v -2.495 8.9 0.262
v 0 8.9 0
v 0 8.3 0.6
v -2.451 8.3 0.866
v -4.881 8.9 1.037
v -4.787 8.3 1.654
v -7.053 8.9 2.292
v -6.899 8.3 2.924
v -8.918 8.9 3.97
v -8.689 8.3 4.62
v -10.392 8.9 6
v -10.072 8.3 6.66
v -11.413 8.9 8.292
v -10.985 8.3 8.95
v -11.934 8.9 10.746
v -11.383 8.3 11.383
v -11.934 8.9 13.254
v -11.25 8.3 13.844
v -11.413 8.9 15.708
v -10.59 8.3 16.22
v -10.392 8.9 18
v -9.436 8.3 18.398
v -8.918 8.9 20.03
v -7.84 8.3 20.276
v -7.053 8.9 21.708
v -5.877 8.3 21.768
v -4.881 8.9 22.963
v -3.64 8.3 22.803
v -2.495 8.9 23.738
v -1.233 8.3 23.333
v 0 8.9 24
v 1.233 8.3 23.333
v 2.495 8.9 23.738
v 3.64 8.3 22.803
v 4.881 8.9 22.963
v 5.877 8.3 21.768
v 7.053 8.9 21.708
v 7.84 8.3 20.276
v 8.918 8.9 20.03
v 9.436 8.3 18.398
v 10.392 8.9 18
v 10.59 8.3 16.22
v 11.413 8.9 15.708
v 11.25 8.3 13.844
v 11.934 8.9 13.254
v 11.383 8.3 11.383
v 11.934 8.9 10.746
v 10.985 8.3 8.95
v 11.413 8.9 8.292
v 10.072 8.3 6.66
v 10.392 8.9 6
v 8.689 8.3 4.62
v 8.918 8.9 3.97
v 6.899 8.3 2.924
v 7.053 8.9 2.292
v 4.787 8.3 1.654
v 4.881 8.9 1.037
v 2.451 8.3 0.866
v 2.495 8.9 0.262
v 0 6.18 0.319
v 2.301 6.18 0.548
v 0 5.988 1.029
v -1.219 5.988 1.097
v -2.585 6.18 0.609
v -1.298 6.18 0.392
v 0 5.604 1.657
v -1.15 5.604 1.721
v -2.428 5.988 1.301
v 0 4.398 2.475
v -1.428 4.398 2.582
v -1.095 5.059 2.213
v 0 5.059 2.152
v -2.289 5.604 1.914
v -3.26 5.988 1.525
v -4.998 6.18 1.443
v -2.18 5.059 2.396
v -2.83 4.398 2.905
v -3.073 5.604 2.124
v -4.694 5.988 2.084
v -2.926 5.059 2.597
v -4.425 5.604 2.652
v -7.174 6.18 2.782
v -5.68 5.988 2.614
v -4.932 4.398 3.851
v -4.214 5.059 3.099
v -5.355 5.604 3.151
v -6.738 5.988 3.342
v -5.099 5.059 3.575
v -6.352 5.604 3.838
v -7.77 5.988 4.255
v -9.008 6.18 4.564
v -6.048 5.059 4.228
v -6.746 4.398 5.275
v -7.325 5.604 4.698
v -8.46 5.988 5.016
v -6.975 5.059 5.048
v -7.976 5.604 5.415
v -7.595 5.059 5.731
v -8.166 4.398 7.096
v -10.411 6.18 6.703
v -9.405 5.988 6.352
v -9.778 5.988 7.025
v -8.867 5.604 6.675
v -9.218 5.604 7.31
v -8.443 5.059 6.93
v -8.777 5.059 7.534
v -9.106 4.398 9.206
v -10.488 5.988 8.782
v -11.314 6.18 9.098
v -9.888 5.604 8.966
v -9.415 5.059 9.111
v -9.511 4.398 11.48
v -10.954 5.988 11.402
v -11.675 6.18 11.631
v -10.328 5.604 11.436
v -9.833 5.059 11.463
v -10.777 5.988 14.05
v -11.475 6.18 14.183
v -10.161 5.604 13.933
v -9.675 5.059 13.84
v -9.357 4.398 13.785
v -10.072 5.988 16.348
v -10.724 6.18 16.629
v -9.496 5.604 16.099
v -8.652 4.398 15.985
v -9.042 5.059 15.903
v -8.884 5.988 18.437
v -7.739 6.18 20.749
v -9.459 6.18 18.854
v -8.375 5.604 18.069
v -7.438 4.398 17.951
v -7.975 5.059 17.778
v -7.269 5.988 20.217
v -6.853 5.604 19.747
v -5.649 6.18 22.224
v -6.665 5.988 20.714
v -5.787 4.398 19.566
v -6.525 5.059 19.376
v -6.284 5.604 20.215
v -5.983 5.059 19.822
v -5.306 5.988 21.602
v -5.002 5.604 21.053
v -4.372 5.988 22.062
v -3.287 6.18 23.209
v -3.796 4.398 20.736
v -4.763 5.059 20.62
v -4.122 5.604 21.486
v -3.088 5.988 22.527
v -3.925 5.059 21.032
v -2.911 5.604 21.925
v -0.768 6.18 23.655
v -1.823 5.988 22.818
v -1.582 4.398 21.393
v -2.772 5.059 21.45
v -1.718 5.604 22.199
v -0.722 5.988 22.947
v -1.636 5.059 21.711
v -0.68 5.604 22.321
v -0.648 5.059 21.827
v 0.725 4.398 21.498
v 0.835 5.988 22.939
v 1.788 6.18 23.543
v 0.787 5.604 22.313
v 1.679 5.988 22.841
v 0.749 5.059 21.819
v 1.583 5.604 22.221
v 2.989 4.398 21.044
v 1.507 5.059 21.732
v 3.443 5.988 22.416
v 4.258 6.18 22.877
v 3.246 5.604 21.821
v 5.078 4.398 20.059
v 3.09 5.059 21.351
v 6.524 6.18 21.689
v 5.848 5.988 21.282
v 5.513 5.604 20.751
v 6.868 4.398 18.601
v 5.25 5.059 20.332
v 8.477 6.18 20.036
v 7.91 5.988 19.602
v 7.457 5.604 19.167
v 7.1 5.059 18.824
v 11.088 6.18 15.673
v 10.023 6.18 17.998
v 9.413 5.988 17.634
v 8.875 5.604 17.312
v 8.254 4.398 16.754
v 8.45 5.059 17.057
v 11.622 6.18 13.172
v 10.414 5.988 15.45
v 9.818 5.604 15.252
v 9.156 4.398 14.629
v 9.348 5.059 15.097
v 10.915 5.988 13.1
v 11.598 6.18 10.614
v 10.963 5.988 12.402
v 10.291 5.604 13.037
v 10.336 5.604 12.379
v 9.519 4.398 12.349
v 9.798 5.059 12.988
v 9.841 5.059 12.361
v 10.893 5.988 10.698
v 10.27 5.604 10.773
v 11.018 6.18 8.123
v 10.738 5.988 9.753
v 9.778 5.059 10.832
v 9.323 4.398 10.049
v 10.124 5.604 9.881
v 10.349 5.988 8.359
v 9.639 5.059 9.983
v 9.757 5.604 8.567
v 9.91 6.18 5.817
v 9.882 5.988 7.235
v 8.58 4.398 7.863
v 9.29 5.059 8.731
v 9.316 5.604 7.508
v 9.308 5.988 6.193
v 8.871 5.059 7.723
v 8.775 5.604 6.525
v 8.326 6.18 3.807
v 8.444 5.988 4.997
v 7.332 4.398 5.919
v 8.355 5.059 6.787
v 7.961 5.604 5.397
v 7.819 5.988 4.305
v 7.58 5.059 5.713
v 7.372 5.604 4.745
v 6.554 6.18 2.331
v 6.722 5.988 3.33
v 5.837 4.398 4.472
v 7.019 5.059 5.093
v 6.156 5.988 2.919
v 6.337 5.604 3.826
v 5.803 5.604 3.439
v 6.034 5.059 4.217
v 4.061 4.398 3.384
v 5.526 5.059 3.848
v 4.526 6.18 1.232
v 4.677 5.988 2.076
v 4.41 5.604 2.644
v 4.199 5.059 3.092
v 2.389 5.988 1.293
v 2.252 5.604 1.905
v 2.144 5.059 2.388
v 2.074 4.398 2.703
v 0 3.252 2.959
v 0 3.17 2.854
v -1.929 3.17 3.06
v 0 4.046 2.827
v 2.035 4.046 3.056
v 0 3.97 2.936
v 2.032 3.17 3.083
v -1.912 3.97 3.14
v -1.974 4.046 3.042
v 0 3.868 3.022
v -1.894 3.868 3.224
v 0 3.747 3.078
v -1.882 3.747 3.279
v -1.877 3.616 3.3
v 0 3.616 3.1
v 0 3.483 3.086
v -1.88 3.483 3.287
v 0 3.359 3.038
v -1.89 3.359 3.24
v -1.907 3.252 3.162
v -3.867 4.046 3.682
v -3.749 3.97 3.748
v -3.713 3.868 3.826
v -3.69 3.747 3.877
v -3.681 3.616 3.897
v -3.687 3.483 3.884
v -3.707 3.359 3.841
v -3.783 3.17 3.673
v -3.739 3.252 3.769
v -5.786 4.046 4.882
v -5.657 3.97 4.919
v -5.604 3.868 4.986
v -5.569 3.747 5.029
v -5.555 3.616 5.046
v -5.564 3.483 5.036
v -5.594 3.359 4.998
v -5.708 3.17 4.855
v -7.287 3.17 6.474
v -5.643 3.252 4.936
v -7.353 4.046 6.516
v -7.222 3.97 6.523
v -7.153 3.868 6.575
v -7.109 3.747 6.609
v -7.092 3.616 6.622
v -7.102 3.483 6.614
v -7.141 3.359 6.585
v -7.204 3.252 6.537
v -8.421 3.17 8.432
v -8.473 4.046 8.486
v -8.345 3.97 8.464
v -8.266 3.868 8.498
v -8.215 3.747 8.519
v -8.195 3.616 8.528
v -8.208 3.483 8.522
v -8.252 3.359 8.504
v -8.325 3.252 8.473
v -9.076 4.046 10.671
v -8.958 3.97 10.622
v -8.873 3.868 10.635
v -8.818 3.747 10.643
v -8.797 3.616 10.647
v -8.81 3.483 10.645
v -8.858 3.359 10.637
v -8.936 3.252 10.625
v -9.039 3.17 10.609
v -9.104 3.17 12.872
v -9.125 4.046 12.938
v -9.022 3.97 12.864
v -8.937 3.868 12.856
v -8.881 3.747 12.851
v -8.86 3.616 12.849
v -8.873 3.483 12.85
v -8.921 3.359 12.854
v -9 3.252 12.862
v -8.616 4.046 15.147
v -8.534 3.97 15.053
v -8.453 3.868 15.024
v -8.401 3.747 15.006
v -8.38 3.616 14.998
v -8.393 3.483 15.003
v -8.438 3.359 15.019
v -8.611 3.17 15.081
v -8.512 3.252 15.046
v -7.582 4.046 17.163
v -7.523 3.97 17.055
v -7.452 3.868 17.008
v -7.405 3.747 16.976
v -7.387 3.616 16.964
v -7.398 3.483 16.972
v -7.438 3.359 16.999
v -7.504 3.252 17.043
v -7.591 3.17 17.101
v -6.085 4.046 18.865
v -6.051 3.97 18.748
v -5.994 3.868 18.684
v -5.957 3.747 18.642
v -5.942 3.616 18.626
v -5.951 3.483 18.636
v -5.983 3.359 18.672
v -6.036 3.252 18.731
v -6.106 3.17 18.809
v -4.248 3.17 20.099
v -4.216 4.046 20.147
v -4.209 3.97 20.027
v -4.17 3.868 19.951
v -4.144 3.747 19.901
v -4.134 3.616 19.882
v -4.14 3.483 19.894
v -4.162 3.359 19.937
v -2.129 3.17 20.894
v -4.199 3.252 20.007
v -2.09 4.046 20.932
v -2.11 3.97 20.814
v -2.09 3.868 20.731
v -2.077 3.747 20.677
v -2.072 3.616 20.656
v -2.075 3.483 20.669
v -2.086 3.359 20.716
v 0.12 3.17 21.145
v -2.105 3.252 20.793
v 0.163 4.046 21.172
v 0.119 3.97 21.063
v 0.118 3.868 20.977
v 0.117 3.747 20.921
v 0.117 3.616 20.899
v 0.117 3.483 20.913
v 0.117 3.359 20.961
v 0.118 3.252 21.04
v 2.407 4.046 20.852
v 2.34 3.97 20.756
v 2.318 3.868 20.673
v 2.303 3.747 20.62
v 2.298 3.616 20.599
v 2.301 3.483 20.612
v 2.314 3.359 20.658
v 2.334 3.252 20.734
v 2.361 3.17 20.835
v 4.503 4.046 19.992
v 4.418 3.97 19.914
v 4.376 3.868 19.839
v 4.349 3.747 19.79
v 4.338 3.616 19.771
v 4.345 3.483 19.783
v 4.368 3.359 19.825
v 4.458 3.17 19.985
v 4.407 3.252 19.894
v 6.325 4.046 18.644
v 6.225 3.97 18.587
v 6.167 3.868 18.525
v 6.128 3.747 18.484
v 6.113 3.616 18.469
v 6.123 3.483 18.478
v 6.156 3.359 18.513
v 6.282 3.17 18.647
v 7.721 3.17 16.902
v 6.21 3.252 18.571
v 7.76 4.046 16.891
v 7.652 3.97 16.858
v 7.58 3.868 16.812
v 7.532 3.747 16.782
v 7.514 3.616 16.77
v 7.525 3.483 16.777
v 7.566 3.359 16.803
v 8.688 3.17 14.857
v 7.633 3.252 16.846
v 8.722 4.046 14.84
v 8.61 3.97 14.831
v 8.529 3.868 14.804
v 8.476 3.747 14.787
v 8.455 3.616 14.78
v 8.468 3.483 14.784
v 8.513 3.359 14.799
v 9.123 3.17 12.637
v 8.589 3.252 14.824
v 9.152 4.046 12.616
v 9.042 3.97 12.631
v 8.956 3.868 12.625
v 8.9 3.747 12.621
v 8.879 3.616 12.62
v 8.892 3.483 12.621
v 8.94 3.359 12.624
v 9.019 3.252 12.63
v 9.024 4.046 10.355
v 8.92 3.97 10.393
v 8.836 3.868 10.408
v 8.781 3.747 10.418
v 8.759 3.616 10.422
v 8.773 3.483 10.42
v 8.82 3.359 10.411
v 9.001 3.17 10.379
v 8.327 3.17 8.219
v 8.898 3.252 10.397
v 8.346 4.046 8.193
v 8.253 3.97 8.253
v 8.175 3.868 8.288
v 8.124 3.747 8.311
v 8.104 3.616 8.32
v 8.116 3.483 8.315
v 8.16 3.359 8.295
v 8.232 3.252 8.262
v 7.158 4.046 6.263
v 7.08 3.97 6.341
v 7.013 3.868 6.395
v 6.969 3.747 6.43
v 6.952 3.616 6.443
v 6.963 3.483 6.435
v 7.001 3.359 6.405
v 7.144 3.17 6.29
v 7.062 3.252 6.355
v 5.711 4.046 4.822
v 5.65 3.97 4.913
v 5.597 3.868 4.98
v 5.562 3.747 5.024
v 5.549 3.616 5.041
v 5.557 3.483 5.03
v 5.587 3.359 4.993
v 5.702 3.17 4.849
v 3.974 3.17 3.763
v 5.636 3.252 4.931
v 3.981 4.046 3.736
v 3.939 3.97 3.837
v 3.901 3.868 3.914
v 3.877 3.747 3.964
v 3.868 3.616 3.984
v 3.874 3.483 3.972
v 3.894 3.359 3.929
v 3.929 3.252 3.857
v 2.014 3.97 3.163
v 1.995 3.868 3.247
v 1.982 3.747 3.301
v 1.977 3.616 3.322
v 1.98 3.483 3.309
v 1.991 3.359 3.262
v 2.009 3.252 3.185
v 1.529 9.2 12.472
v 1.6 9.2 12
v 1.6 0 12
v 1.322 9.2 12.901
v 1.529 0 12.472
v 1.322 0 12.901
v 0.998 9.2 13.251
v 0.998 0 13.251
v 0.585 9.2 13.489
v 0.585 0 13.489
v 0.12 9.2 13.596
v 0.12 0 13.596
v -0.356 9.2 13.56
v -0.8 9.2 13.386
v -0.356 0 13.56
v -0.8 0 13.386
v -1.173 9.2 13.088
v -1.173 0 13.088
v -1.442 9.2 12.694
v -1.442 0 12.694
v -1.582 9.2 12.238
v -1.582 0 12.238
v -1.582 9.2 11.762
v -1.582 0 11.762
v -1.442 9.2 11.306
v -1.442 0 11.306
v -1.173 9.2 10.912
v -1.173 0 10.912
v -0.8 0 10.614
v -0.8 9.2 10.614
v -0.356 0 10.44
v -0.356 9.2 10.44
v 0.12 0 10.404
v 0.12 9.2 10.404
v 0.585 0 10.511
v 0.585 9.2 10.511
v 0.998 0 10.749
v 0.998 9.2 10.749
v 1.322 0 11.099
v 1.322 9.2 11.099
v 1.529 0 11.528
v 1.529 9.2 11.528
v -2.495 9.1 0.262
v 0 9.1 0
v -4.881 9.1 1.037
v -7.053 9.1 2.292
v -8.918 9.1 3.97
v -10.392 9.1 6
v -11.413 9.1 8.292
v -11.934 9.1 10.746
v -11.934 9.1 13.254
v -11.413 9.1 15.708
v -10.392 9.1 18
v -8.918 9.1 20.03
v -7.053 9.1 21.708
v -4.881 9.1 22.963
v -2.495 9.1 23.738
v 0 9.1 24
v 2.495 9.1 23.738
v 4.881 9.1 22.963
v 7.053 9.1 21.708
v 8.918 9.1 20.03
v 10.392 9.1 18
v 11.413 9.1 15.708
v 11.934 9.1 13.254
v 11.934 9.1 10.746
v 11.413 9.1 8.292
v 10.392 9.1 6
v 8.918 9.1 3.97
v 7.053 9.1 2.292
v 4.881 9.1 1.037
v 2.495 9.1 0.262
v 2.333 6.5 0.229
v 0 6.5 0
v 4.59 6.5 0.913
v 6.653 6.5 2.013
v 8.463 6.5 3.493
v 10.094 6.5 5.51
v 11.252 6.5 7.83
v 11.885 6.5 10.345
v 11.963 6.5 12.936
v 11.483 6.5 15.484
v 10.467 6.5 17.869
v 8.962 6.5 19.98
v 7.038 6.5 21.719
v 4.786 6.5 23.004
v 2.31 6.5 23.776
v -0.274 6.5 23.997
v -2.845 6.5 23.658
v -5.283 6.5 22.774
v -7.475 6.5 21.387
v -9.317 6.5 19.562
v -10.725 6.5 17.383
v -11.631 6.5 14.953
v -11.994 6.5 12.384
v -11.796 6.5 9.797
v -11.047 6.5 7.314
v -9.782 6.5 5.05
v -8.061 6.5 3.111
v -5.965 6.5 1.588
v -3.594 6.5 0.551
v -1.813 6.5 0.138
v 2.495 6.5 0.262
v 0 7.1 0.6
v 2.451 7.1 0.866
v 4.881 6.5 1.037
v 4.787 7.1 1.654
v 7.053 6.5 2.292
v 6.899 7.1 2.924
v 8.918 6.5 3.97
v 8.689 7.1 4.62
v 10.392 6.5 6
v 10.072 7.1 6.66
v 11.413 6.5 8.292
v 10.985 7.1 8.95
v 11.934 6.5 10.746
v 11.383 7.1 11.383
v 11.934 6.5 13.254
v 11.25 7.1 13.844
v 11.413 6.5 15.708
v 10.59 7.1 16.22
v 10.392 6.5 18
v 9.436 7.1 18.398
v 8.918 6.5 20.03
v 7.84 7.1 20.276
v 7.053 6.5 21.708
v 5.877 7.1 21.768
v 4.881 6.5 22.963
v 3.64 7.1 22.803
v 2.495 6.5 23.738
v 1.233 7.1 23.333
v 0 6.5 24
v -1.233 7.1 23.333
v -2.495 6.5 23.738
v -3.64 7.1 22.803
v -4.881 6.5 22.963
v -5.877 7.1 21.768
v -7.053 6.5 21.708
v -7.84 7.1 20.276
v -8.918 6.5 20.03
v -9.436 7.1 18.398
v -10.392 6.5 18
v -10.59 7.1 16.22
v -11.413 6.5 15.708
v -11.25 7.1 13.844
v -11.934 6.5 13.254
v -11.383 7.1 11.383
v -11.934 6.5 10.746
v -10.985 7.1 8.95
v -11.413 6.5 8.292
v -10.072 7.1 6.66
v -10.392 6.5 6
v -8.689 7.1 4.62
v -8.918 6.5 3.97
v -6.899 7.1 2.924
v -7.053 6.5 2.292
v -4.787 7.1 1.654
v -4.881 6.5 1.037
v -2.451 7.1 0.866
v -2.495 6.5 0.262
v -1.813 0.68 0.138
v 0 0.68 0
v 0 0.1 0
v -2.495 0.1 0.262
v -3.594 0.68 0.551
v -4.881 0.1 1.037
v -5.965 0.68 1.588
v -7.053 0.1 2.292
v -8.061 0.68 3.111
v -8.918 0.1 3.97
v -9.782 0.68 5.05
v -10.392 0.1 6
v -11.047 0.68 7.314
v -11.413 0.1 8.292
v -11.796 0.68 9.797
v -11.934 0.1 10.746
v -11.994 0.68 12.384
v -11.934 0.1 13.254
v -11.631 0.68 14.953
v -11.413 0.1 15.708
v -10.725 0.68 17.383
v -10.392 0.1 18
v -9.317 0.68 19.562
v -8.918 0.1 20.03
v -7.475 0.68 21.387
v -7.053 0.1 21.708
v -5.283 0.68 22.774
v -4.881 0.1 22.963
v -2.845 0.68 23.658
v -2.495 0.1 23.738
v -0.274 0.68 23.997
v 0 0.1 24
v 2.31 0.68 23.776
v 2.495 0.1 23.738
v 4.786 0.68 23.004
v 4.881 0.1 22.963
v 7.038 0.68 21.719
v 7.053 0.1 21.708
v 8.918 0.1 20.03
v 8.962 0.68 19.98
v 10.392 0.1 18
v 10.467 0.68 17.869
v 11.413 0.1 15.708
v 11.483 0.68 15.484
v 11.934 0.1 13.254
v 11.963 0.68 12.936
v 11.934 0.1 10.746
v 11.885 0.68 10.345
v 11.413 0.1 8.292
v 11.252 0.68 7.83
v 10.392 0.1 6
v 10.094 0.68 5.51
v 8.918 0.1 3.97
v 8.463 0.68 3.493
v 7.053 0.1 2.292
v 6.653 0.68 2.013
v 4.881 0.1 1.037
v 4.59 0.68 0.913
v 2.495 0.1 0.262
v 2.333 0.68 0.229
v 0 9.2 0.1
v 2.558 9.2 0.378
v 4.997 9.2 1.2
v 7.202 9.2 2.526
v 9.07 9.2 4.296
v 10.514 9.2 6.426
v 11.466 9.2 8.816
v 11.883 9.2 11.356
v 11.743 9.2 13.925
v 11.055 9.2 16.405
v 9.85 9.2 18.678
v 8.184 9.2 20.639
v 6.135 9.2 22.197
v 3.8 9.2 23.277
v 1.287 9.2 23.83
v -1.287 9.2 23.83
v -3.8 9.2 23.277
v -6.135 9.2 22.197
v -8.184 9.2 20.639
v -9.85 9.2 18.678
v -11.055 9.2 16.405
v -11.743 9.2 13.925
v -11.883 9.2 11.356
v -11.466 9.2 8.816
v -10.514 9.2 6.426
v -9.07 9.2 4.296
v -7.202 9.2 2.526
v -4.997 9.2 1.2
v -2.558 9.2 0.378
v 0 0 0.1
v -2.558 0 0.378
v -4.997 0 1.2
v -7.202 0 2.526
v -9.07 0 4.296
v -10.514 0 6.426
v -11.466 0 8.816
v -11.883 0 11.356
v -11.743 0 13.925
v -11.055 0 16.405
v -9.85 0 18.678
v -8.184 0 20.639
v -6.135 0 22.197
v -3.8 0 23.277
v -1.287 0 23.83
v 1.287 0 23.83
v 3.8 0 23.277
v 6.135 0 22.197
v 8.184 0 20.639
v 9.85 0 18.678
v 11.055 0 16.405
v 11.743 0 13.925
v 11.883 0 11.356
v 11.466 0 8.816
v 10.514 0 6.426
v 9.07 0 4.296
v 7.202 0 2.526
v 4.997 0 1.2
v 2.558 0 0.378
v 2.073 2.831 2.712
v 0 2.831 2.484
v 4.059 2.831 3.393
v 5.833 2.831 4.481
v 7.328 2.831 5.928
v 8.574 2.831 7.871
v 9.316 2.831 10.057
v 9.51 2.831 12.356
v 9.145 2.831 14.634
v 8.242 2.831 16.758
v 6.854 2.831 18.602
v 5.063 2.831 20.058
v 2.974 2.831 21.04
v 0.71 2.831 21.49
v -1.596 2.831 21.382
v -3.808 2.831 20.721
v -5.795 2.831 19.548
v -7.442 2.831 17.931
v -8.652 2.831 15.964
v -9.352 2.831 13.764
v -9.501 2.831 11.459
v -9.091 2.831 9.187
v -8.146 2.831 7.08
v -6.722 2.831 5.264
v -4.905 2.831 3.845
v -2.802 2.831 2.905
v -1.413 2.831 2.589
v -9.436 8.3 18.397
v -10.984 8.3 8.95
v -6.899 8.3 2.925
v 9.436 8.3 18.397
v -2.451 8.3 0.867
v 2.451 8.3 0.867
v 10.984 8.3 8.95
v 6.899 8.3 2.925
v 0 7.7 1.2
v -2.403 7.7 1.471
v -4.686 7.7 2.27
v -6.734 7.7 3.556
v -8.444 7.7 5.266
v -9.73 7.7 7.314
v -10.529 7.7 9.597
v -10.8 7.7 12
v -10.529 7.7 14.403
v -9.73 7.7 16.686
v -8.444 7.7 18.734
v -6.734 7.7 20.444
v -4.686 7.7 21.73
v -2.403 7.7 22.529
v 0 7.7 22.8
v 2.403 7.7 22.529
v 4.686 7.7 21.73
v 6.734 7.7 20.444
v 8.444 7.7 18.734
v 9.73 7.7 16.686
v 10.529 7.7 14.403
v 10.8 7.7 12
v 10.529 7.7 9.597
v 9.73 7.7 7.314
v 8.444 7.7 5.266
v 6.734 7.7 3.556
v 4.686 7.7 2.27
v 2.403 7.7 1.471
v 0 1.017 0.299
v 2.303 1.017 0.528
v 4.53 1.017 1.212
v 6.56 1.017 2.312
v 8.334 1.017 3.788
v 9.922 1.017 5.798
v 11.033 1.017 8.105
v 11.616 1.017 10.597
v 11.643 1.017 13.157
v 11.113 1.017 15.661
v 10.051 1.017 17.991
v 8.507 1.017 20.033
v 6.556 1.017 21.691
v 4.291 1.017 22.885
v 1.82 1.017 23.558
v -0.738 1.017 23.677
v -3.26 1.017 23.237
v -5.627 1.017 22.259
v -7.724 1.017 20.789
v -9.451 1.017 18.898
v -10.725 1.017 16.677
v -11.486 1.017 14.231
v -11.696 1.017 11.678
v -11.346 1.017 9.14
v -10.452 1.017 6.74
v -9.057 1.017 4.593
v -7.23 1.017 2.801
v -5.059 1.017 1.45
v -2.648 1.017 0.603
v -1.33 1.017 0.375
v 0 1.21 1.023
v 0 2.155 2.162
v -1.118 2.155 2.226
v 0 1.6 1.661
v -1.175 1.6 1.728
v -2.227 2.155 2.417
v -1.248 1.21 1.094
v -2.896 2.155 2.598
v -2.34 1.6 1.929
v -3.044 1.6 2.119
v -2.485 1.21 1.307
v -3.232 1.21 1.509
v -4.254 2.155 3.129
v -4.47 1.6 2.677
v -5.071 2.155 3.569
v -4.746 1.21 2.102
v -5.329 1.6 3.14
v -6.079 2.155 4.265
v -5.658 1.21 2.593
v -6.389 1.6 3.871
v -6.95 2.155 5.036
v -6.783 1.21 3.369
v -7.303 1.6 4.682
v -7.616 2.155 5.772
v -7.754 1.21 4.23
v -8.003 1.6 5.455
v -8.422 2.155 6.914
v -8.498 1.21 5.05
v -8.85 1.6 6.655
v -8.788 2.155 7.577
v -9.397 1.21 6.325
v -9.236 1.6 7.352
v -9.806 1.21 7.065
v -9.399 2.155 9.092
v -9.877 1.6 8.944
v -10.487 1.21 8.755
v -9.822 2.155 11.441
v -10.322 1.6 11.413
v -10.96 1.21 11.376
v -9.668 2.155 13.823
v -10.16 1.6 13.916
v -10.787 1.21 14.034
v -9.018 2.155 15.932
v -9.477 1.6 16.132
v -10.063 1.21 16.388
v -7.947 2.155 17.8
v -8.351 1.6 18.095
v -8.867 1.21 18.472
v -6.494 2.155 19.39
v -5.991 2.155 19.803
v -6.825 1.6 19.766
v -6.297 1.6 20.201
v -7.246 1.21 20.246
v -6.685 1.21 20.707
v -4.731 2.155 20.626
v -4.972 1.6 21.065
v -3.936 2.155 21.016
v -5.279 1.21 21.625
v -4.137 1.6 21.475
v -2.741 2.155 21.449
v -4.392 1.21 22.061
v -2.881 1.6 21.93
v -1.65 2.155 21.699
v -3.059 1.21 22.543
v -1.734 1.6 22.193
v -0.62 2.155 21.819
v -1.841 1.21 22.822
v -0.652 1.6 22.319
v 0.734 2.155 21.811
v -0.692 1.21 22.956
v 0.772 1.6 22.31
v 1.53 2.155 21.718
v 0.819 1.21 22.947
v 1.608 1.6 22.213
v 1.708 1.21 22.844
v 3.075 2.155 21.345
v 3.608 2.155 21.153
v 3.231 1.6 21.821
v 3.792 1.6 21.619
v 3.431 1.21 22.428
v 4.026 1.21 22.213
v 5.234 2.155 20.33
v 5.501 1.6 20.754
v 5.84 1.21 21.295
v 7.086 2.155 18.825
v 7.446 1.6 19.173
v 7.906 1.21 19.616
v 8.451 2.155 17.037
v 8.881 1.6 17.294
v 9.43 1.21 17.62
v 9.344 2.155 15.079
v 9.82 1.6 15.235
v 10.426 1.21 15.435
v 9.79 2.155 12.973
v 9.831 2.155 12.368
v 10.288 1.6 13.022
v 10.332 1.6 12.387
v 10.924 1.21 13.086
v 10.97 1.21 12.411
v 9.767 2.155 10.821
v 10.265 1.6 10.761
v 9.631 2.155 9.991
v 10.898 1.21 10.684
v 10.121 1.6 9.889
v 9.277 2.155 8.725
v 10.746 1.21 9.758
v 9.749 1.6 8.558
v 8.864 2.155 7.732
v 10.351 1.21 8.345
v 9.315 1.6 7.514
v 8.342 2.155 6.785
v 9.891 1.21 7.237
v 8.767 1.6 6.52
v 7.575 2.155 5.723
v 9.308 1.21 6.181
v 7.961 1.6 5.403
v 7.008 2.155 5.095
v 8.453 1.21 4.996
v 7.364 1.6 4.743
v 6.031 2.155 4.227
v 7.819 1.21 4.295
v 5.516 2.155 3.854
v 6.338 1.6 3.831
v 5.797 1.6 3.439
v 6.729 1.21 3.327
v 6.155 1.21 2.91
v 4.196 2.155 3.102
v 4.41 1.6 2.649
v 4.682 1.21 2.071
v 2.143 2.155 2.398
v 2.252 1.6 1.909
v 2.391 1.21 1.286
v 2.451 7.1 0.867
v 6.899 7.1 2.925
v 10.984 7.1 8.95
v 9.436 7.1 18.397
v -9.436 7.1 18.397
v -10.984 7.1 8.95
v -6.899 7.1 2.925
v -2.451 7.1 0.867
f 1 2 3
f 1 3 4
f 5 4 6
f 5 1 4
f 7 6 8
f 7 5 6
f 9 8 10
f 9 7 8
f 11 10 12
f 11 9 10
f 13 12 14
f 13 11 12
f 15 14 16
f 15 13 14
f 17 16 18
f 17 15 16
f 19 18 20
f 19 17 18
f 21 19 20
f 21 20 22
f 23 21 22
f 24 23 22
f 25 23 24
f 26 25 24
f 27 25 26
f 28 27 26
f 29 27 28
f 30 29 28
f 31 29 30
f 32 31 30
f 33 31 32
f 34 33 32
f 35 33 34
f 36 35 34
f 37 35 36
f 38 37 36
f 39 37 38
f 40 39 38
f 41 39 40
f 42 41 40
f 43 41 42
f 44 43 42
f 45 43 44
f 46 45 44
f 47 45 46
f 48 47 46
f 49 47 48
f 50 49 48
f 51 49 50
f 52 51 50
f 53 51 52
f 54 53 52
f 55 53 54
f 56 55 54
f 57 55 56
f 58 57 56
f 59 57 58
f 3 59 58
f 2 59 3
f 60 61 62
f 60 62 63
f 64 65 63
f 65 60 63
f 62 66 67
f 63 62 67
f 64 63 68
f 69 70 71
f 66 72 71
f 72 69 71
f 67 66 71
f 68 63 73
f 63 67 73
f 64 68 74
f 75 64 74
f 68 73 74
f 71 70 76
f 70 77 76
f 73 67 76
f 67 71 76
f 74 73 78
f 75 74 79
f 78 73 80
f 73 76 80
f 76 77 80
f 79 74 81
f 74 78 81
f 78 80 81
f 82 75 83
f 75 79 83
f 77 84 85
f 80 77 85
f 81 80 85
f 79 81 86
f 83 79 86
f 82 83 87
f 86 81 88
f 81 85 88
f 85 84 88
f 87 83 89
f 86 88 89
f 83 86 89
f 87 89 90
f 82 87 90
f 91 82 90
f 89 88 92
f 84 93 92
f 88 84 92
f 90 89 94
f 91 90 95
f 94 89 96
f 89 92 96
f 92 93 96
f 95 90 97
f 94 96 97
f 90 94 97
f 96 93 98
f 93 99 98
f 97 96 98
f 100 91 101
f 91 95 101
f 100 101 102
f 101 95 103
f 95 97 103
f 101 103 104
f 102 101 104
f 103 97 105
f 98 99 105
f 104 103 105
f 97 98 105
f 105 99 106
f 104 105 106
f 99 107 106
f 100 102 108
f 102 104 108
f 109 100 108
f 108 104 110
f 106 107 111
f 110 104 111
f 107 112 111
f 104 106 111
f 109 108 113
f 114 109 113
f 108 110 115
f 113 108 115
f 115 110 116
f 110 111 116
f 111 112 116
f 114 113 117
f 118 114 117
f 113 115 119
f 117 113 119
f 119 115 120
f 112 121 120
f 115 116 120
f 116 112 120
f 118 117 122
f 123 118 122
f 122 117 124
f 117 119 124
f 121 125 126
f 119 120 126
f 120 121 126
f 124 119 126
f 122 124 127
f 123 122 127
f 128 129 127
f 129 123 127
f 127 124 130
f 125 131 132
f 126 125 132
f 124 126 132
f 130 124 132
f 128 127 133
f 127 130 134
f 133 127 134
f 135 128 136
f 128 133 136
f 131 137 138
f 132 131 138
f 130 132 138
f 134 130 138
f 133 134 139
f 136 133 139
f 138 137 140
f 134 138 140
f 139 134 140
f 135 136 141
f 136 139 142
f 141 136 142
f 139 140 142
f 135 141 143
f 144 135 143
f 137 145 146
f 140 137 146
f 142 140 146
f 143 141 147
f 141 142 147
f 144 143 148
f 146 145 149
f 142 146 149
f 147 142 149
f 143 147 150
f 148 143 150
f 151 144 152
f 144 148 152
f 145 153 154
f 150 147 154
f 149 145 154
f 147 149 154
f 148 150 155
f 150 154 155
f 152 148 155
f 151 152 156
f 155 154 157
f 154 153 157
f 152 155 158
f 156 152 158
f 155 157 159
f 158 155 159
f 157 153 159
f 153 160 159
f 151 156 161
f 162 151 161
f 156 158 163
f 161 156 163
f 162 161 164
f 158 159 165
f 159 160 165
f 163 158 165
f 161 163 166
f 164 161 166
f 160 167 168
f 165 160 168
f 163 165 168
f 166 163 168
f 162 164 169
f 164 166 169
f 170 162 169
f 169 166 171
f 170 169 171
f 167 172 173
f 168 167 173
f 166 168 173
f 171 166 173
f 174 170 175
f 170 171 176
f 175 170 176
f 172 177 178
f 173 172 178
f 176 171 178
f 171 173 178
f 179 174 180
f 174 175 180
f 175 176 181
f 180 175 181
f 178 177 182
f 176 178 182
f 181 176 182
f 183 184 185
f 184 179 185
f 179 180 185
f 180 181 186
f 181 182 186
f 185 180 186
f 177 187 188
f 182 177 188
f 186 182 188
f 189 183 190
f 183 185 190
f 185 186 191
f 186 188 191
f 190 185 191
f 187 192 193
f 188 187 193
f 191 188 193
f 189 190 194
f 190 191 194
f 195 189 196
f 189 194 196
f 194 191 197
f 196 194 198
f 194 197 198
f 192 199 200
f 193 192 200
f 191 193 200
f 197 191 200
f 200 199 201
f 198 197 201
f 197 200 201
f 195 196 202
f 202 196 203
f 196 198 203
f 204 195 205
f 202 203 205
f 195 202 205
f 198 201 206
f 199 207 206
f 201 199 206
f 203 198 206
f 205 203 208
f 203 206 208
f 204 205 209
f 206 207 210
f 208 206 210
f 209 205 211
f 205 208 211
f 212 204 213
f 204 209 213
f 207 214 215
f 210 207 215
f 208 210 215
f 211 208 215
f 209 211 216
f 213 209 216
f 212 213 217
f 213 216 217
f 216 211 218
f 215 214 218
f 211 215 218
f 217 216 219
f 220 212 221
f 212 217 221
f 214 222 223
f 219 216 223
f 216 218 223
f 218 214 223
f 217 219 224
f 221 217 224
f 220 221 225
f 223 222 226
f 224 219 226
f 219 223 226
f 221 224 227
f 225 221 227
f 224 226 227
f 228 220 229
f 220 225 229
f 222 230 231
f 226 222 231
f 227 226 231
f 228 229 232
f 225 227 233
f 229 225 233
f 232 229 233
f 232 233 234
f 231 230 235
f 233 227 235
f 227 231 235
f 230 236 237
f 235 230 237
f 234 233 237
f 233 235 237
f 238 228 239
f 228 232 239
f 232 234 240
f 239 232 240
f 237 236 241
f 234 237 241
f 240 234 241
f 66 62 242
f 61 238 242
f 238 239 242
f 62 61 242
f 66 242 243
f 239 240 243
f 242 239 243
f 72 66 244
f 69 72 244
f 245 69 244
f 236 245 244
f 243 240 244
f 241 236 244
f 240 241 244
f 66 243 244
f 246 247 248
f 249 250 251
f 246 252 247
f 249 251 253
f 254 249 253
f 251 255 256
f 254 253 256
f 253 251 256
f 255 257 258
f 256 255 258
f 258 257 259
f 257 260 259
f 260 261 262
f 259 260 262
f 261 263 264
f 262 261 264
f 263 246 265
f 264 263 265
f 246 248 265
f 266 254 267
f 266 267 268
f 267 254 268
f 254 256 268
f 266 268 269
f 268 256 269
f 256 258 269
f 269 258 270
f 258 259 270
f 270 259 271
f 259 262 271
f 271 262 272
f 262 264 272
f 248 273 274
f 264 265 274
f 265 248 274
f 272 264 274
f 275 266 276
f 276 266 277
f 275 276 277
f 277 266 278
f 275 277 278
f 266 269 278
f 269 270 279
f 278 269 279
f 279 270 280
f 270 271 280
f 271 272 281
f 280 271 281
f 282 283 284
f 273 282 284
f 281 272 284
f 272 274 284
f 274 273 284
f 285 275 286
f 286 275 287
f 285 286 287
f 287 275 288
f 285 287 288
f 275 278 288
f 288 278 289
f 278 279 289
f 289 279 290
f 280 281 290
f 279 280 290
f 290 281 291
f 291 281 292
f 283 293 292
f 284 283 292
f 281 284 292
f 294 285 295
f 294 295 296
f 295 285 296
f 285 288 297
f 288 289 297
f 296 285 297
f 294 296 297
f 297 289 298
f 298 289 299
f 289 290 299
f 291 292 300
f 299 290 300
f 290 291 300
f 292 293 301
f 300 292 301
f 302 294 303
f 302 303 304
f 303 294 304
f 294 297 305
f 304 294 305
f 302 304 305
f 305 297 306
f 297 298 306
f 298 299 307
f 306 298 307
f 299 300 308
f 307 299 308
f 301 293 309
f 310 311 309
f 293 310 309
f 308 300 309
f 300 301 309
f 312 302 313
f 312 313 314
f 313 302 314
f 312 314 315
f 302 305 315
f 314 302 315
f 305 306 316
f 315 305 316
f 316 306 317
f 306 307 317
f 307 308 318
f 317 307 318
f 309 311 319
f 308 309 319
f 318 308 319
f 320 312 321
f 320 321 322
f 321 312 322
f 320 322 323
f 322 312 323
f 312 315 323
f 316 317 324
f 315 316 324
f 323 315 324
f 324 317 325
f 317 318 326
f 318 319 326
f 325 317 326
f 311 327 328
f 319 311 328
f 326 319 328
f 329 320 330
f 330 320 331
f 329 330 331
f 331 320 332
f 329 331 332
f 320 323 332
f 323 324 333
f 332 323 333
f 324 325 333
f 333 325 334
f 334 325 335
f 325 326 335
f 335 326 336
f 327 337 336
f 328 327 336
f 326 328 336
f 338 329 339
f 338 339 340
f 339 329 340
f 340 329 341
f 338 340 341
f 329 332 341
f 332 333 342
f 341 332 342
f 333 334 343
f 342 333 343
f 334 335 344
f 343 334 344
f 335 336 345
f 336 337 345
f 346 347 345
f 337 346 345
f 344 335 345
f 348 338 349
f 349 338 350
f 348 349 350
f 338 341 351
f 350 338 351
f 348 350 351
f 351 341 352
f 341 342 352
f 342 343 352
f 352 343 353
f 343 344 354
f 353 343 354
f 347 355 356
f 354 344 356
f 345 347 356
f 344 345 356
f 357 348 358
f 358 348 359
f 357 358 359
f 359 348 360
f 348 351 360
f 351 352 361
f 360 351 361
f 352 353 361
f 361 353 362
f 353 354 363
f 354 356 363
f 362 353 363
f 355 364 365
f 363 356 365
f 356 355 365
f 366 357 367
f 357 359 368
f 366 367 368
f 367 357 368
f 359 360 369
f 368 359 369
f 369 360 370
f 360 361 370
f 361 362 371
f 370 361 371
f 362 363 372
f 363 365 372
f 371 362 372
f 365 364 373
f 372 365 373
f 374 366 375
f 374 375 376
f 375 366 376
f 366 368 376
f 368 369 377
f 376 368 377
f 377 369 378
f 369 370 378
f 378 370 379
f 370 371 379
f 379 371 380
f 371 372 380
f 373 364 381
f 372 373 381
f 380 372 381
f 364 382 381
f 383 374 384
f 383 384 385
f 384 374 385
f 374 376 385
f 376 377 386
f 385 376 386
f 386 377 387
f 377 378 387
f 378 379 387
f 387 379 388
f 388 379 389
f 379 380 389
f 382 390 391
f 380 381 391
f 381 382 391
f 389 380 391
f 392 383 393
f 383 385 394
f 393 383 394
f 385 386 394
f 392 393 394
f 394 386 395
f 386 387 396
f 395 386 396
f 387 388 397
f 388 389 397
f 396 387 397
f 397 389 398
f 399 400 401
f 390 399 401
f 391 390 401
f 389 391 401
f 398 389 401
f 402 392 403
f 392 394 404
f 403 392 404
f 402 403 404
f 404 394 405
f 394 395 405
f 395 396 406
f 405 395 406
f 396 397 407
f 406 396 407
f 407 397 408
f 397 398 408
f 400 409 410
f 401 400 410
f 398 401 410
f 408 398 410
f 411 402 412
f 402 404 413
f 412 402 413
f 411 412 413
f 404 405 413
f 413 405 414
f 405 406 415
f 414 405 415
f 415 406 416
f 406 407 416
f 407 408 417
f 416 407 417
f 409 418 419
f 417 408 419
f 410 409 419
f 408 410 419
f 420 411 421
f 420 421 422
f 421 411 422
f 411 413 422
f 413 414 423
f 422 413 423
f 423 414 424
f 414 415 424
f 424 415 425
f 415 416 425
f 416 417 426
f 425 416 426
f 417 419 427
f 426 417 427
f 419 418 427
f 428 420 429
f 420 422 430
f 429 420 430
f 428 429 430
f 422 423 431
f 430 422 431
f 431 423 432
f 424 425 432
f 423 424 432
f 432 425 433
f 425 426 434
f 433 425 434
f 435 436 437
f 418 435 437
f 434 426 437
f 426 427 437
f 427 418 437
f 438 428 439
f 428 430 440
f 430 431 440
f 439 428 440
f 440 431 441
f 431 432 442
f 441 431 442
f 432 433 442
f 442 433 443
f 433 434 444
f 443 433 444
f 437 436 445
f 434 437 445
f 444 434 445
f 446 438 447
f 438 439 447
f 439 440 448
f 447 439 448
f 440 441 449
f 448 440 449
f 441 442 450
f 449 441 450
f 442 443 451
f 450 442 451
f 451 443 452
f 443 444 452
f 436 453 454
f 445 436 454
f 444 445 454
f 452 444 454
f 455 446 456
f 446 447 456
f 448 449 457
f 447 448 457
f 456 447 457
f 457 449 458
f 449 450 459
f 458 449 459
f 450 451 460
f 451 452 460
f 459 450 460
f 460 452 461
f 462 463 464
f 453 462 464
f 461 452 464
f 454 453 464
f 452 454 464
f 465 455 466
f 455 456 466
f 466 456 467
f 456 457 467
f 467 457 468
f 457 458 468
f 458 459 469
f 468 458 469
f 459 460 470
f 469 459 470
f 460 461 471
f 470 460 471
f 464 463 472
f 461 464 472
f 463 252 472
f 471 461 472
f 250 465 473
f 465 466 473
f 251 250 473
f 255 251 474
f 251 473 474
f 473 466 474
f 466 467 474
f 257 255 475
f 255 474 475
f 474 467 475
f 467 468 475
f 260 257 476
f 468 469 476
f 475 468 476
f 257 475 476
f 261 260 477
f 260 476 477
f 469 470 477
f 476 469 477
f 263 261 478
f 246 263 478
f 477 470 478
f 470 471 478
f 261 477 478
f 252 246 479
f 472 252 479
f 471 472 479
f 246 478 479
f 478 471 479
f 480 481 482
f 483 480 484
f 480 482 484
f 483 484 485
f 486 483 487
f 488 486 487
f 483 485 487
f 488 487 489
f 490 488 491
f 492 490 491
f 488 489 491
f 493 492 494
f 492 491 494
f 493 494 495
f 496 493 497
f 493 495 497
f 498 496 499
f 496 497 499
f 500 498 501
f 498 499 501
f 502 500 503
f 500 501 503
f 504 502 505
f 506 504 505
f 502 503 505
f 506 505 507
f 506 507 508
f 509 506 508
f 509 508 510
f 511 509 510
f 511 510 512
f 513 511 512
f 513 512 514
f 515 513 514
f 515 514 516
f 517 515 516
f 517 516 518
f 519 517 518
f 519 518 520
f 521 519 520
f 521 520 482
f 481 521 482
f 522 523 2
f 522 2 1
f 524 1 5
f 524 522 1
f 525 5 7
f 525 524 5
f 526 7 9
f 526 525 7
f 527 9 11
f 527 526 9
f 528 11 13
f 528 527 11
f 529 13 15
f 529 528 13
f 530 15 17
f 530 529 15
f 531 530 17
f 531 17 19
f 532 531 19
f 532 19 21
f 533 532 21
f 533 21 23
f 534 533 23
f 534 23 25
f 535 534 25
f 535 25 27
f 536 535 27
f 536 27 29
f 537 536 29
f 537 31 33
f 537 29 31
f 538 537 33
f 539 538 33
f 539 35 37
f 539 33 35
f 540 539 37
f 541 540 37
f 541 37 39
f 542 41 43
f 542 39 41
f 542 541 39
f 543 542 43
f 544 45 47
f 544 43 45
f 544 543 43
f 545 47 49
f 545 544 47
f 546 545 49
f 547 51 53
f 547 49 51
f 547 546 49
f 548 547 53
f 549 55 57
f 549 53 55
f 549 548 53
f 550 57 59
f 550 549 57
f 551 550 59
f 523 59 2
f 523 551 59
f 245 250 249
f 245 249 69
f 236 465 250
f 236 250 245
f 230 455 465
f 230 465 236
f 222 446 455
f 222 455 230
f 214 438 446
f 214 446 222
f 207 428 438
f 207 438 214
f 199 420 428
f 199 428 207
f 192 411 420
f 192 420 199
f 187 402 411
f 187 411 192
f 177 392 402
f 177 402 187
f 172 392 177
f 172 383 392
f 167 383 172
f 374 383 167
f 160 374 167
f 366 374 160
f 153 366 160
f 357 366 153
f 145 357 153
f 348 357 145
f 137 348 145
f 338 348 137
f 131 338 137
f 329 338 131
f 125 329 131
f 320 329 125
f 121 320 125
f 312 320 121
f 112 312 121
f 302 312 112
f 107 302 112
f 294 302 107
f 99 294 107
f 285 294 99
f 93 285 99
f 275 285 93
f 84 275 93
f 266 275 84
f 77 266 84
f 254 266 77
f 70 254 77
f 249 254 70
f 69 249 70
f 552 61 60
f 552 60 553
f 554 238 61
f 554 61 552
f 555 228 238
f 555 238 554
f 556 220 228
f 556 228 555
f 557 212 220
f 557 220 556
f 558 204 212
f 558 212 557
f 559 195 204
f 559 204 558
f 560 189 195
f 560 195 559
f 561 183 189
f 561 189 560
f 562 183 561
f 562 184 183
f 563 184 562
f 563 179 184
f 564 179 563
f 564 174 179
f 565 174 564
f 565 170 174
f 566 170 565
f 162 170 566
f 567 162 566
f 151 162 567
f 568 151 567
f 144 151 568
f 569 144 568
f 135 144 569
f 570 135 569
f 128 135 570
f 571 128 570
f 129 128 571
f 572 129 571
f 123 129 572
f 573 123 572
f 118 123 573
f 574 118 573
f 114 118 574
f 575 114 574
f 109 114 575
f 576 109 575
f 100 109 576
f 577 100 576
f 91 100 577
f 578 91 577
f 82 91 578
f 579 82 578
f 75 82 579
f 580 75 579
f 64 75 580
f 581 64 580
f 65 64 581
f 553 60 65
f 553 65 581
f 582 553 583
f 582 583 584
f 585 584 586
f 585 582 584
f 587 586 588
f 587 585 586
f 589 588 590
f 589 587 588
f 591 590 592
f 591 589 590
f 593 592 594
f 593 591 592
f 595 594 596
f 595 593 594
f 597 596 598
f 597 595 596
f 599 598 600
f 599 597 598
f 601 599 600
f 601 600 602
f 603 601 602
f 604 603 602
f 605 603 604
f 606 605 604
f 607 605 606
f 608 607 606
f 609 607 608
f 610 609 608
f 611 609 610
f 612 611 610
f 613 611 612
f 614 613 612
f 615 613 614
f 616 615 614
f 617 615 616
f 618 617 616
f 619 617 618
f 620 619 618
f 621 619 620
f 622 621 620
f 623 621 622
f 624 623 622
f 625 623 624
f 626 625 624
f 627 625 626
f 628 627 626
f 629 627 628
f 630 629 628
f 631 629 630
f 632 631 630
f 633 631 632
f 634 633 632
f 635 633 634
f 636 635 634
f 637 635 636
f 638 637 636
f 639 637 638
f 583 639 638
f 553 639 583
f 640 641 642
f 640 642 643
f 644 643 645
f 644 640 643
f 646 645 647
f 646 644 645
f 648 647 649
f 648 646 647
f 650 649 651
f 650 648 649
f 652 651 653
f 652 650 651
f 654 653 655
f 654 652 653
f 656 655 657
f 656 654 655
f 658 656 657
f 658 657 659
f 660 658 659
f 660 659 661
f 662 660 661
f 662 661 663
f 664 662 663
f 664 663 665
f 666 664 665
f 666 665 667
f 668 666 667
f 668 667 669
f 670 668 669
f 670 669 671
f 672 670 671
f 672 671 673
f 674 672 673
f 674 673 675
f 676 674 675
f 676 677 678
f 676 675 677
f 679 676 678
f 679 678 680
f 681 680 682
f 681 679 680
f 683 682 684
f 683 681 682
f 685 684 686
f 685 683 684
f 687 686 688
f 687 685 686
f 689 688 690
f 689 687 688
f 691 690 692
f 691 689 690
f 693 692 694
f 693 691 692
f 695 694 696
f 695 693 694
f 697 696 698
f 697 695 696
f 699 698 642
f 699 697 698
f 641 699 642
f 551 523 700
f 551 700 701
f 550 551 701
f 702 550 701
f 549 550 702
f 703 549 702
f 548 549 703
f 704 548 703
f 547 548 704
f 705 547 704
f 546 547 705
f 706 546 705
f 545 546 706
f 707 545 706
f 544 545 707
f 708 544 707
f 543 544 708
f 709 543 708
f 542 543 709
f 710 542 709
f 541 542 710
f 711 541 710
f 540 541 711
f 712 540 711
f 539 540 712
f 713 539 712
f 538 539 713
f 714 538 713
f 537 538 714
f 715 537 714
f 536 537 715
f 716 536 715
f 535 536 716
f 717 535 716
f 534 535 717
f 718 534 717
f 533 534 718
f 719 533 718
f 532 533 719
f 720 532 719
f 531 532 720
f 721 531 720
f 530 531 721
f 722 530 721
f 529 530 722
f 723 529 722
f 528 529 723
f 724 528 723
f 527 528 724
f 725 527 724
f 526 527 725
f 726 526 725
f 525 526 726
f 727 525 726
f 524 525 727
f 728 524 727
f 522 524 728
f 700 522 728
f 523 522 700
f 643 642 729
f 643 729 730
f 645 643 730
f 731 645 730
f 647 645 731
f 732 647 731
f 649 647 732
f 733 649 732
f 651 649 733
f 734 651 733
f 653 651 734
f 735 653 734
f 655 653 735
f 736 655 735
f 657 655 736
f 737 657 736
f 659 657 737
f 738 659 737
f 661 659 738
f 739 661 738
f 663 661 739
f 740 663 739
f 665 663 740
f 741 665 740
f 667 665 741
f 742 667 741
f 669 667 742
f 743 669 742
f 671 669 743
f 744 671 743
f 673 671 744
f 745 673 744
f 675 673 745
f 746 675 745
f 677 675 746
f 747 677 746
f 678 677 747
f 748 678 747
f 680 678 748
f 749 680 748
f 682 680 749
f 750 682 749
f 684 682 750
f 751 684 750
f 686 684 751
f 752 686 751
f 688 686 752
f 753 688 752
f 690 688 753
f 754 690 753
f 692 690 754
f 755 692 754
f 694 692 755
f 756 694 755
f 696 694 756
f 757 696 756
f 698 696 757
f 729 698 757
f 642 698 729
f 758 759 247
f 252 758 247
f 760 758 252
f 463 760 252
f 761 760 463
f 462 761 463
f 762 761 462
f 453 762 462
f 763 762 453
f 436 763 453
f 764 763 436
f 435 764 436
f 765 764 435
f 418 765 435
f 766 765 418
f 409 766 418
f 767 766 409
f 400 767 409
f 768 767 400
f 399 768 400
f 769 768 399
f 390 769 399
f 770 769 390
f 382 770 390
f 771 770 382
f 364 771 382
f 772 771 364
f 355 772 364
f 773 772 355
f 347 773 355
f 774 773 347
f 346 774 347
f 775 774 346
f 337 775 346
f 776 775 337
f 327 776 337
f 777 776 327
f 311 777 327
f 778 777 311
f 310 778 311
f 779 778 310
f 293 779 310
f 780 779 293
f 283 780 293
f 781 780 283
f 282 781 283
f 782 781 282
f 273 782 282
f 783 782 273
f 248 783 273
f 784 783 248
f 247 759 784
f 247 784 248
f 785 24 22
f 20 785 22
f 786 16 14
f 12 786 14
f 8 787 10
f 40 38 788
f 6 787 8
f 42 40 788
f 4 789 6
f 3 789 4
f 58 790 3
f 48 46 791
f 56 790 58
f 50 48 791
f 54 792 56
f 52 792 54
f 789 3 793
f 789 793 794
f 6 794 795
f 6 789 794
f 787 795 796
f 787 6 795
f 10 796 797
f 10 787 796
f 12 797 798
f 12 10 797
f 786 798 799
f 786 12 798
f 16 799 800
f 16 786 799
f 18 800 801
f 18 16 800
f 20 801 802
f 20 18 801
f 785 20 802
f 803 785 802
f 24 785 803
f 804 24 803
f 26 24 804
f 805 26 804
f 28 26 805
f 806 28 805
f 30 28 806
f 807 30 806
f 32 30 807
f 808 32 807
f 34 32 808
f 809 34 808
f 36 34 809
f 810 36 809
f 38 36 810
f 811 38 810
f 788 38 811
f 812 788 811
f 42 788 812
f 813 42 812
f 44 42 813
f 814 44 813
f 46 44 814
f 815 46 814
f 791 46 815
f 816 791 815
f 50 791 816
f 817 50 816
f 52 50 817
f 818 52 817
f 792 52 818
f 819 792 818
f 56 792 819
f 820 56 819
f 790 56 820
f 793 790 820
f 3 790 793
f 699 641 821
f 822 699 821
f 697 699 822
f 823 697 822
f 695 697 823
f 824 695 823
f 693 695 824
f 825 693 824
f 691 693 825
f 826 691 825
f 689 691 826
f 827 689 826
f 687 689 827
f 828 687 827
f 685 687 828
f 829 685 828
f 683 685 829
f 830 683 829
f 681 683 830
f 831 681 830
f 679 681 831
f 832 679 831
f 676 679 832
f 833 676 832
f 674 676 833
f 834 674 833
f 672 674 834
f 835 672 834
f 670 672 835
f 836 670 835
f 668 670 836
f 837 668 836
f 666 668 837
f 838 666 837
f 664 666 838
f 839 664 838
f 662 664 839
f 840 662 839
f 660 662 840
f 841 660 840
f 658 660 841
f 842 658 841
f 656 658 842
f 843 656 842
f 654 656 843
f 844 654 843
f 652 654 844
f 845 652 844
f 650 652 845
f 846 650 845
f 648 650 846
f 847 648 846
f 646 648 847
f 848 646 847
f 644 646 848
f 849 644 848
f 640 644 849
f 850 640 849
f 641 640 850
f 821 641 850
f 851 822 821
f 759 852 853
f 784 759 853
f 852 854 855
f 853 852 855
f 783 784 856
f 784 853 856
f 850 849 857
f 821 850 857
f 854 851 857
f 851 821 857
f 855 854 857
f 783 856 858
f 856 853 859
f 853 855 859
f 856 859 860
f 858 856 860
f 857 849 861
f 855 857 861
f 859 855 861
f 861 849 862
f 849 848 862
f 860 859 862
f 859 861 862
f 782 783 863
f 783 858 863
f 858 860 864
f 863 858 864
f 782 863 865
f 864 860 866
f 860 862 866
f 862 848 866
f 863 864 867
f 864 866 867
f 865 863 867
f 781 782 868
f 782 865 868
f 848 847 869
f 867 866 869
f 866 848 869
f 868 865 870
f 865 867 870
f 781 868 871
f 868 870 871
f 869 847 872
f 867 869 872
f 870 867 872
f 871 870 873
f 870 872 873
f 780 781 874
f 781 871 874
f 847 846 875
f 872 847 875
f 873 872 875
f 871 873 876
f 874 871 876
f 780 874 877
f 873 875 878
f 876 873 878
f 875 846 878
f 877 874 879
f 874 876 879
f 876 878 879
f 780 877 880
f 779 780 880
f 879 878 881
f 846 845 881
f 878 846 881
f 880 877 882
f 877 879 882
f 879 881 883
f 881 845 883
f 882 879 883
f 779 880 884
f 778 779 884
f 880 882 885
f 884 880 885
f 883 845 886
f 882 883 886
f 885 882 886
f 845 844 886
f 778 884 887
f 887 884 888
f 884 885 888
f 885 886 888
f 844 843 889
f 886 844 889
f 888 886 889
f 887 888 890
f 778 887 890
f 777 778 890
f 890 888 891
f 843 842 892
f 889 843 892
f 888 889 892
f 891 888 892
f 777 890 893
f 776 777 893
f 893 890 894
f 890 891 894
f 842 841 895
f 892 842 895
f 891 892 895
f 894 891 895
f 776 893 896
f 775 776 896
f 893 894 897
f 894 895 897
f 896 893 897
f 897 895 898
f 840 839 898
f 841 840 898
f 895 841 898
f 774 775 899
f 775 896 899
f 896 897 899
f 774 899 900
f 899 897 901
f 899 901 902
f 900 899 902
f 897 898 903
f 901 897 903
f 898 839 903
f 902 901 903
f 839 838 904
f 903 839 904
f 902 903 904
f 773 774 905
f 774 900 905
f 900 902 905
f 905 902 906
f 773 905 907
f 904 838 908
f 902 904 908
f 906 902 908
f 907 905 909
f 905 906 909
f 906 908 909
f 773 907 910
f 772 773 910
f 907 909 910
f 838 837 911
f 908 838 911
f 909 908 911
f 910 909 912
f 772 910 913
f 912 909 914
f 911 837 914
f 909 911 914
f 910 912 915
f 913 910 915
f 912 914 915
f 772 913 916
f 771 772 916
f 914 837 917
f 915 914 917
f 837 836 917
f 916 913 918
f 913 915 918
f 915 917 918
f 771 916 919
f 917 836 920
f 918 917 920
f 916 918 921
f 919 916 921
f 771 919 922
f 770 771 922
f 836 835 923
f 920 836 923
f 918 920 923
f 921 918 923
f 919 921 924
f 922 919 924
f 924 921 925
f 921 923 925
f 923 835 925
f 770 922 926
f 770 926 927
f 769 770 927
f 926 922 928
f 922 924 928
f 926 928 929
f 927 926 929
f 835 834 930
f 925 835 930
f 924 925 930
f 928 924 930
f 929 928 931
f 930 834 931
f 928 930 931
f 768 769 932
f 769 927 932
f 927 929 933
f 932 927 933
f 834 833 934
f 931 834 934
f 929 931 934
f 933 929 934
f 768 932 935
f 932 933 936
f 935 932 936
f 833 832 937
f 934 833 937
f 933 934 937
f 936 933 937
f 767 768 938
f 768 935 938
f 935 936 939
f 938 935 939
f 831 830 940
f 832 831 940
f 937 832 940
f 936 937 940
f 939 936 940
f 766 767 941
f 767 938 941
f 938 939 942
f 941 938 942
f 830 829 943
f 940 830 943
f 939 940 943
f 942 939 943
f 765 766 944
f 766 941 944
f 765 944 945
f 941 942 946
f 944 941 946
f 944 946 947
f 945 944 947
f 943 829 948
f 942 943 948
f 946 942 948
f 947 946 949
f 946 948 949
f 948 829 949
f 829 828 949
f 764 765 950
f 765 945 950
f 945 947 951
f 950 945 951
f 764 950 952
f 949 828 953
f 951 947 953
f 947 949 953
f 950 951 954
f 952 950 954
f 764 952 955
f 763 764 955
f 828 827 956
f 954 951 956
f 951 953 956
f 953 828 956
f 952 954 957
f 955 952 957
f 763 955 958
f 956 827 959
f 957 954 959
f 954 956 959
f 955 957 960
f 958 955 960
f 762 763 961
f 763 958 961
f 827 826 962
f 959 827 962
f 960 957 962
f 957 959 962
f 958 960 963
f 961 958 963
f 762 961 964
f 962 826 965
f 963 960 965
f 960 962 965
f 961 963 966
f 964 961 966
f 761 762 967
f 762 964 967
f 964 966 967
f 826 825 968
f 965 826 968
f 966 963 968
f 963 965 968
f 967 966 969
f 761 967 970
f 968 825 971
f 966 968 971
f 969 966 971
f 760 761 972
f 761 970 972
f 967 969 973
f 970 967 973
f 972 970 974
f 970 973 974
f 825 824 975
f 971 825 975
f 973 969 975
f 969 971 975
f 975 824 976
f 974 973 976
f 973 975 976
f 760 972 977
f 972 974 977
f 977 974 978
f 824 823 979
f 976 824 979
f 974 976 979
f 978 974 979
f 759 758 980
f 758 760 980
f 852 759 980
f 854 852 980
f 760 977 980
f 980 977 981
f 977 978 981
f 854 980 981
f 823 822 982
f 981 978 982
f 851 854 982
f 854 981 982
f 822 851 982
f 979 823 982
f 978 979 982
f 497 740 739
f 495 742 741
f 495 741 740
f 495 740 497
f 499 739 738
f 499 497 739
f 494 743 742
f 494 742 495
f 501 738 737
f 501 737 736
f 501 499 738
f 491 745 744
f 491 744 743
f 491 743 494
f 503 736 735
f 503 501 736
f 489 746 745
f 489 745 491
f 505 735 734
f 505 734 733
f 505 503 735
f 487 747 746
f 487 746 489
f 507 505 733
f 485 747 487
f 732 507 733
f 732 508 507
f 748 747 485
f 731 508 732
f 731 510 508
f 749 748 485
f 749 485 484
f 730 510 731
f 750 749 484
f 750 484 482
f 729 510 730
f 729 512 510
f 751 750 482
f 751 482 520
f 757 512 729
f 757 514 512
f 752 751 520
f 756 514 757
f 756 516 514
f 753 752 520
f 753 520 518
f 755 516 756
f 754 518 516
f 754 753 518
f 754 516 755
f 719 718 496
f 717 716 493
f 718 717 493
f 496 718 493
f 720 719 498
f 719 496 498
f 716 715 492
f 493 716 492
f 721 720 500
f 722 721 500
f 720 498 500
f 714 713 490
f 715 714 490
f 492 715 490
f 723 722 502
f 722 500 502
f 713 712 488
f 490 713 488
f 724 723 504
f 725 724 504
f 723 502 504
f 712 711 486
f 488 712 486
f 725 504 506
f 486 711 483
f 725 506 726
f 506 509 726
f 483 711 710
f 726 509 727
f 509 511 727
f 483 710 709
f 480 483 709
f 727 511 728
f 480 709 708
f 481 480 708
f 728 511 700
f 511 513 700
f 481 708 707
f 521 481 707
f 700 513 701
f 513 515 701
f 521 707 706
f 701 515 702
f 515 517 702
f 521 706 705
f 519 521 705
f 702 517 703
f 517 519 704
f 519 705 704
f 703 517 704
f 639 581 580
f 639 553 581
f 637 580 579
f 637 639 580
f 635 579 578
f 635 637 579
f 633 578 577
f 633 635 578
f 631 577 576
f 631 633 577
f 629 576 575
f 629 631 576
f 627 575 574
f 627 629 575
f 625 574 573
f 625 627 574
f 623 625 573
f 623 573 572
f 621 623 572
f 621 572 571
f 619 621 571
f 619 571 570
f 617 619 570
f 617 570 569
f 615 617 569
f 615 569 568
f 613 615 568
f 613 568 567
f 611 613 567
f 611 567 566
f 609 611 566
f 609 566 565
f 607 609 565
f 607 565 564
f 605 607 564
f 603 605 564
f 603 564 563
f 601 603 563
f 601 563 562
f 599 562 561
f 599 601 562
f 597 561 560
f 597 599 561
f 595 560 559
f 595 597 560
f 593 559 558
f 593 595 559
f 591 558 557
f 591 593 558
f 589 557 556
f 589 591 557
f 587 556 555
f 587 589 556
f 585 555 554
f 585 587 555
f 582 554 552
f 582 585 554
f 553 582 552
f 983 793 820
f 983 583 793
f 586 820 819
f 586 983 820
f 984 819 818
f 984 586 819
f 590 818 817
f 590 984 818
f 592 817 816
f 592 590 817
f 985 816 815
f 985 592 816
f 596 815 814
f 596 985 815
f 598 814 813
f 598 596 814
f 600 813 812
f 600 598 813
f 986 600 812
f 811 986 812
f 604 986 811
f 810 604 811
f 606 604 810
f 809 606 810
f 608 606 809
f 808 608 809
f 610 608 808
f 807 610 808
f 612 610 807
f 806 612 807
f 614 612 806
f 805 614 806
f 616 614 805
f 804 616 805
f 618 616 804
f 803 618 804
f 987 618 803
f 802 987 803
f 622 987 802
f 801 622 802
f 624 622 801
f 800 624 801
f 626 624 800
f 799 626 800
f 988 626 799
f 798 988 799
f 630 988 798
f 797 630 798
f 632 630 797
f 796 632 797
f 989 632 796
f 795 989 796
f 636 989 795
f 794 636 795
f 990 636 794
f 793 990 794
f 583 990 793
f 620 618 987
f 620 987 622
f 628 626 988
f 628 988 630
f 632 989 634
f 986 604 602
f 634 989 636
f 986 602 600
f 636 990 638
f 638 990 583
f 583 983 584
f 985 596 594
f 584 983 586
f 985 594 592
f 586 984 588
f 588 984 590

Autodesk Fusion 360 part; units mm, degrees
sketch "Sketch1" plane through (0, 0, 0) normal (1, 0, 0) x (0, 1, 0)
  line L0 (0, 0) -> (9.2, 0)
  line L1 (9.2, 0) -> (9.2, 12)
  line L2 (9.2, 12) -> (0, 12)
  line L3 (0, 12) -> (0, 0)
  line L4 (0, 10.3) -> (9.2, 10.3)
  line L5 (7.1, 0) -> (8.3, 0)
  line L6 (8.3, 0) -> (8.3, 1.2)
  line L7 (8.3, 1.2) -> (7.1, 1.2)
  line L8 (7.1, 1.2) -> (7.1, 0)
  circle A0 centre (3.6, 0) radius 2.6
  line L9 (3.6, 0) -> (3.6, 2.6) construction
  circle A1 centre (3.6, 2.6) radius 0.5
  dimension "d1" = 9.2
  dimension "d2" = 12
  dimension "d3" = 1.7
  dimension "d4" = 1.2
  dimension "d5" = 1.2
  dimension "d6" = 7.1
  dimension "d7" = 5.2
  dimension "d8" = 3.6
  dimension "d9" = 1
revolve "Revolve1" add sketch "Sketch1" angle 360 about axis through (0, 9.2, 12) along (0, -1, 0) contours L0 L1 L3 L4 L6 L7 L8 A0 A1 | L1 L2 L3 L4
chamfer "Chamfer1" distance 0.6 angle 45 2 faces at (-0.5962, 7.1, 0.4447) (-1.1327, 8.3, 0.4849)
chamfer "Chamfer1" distance 0.1 angle 45 2 edges at (-11.1879, 9.2, 7.6606) (-11.1879, 0, 7.6606)
chamfer "Chamfer1" distance 0.28 distance2 0.31 2 edges at (-8.8087, 4.0977, 8.5834) (-8.8087, 3.1023, 8.5834) measured on face at (-0.4697, 4.0994, 21.4123) measured on face at (7.1736, 1.0027, 21.4704)
chamfer "Chamfer1" distance 0.32 distance2 0.3 2 edges at (-11.1879, 6.2, 7.6606) (-11.1879, 1, 7.6606) measured on face at (-1.1829, 6.1973, 23.8216) measured on face at (-0.5982, 0.3333, 0.0149)
sketch "Sketch2" plane through (0, 0, 0) normal (0, -1, 0) x (1, 0, 0)
  circle A0 centre (0, 12) radius 11.9
  circle A1 centre (0, 12) radius 1.6
  line L0 (0.0188, 10.4001) -> (0, 0) construction
  dimension "d17" = 3.2
extrude "Extrude1" cut sketch "Sketch2" against normal up to surface (9.2 mm away) contours A1
